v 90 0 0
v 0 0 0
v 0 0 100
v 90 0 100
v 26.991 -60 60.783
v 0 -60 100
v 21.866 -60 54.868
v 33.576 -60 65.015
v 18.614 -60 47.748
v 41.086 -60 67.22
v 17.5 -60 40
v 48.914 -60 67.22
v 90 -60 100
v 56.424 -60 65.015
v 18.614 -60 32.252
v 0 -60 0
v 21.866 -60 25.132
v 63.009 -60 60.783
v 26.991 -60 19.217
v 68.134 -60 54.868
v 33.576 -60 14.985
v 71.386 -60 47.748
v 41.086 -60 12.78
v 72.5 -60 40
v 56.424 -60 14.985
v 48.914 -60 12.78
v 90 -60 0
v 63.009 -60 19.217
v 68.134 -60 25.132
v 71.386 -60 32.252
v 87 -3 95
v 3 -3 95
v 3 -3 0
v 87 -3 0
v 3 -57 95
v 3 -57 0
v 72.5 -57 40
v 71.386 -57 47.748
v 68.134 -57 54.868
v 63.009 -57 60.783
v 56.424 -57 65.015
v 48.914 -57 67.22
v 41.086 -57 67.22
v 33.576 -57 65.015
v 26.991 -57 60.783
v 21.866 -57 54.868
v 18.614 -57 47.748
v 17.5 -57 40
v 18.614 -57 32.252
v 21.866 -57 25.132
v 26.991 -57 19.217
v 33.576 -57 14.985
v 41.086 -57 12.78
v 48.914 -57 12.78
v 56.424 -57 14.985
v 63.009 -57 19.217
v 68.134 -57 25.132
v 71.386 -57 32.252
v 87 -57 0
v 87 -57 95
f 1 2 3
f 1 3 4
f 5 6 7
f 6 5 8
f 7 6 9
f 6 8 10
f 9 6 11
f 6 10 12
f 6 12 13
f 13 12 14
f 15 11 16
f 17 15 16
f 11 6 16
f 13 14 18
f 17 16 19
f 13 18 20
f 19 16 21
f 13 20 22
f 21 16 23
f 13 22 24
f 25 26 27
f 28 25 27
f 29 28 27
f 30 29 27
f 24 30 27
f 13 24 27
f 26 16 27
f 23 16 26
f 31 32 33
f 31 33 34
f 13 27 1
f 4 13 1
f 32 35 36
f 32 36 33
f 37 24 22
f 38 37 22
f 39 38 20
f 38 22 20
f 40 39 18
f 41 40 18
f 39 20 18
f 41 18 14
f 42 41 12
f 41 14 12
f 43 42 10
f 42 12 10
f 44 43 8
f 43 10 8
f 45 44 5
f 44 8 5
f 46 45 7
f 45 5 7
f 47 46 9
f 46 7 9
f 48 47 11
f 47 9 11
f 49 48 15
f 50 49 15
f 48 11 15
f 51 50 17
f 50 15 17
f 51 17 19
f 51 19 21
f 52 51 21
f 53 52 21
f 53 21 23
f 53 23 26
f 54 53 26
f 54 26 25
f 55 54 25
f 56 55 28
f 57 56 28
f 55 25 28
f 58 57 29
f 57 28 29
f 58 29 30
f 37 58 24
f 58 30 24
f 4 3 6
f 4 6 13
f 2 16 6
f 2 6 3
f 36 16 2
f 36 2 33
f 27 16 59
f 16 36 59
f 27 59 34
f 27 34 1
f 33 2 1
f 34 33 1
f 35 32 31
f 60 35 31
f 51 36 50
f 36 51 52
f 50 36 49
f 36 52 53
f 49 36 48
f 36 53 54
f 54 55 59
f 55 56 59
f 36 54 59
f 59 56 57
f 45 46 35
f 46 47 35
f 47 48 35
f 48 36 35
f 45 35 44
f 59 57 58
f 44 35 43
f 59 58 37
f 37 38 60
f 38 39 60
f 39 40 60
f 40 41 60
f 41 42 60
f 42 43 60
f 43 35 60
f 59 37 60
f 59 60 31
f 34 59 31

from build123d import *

# Parameters (mm, degrees)
F0_W     = 90
F0_H     = 60
F1_DEPTH = 100
F3_W     = 84
F3_H     = 54
F4_DEPTH = 95
F5_R     = 27.5
F6_DEPTH = 3


with BuildPart() as f1:
    # F0 (on Top) → F1 (new body)
    with BuildSketch(Plane.XY):
        with Locations((45, -30)):
            Rectangle(F0_W, F0_H)
    extrude(amount=F1_DEPTH)

    # F3 (on offset) → F4 (cut, through all)
    with BuildSketch(Plane.XY.offset(95)):
        with Locations((45, -30)):
            Rectangle(F3_W, F3_H)
    extrude(amount=-F4_DEPTH, mode=Mode.SUBTRACT)

    # F5 (on face) → F6 (cut, through all)
    with BuildSketch(Plane.XZ.offset(60)):
        with Locations((45, 40)):
            Circle(F5_R)
    extrude(amount=-F6_DEPTH, mode=Mode.SUBTRACT)


solid = f1.part
